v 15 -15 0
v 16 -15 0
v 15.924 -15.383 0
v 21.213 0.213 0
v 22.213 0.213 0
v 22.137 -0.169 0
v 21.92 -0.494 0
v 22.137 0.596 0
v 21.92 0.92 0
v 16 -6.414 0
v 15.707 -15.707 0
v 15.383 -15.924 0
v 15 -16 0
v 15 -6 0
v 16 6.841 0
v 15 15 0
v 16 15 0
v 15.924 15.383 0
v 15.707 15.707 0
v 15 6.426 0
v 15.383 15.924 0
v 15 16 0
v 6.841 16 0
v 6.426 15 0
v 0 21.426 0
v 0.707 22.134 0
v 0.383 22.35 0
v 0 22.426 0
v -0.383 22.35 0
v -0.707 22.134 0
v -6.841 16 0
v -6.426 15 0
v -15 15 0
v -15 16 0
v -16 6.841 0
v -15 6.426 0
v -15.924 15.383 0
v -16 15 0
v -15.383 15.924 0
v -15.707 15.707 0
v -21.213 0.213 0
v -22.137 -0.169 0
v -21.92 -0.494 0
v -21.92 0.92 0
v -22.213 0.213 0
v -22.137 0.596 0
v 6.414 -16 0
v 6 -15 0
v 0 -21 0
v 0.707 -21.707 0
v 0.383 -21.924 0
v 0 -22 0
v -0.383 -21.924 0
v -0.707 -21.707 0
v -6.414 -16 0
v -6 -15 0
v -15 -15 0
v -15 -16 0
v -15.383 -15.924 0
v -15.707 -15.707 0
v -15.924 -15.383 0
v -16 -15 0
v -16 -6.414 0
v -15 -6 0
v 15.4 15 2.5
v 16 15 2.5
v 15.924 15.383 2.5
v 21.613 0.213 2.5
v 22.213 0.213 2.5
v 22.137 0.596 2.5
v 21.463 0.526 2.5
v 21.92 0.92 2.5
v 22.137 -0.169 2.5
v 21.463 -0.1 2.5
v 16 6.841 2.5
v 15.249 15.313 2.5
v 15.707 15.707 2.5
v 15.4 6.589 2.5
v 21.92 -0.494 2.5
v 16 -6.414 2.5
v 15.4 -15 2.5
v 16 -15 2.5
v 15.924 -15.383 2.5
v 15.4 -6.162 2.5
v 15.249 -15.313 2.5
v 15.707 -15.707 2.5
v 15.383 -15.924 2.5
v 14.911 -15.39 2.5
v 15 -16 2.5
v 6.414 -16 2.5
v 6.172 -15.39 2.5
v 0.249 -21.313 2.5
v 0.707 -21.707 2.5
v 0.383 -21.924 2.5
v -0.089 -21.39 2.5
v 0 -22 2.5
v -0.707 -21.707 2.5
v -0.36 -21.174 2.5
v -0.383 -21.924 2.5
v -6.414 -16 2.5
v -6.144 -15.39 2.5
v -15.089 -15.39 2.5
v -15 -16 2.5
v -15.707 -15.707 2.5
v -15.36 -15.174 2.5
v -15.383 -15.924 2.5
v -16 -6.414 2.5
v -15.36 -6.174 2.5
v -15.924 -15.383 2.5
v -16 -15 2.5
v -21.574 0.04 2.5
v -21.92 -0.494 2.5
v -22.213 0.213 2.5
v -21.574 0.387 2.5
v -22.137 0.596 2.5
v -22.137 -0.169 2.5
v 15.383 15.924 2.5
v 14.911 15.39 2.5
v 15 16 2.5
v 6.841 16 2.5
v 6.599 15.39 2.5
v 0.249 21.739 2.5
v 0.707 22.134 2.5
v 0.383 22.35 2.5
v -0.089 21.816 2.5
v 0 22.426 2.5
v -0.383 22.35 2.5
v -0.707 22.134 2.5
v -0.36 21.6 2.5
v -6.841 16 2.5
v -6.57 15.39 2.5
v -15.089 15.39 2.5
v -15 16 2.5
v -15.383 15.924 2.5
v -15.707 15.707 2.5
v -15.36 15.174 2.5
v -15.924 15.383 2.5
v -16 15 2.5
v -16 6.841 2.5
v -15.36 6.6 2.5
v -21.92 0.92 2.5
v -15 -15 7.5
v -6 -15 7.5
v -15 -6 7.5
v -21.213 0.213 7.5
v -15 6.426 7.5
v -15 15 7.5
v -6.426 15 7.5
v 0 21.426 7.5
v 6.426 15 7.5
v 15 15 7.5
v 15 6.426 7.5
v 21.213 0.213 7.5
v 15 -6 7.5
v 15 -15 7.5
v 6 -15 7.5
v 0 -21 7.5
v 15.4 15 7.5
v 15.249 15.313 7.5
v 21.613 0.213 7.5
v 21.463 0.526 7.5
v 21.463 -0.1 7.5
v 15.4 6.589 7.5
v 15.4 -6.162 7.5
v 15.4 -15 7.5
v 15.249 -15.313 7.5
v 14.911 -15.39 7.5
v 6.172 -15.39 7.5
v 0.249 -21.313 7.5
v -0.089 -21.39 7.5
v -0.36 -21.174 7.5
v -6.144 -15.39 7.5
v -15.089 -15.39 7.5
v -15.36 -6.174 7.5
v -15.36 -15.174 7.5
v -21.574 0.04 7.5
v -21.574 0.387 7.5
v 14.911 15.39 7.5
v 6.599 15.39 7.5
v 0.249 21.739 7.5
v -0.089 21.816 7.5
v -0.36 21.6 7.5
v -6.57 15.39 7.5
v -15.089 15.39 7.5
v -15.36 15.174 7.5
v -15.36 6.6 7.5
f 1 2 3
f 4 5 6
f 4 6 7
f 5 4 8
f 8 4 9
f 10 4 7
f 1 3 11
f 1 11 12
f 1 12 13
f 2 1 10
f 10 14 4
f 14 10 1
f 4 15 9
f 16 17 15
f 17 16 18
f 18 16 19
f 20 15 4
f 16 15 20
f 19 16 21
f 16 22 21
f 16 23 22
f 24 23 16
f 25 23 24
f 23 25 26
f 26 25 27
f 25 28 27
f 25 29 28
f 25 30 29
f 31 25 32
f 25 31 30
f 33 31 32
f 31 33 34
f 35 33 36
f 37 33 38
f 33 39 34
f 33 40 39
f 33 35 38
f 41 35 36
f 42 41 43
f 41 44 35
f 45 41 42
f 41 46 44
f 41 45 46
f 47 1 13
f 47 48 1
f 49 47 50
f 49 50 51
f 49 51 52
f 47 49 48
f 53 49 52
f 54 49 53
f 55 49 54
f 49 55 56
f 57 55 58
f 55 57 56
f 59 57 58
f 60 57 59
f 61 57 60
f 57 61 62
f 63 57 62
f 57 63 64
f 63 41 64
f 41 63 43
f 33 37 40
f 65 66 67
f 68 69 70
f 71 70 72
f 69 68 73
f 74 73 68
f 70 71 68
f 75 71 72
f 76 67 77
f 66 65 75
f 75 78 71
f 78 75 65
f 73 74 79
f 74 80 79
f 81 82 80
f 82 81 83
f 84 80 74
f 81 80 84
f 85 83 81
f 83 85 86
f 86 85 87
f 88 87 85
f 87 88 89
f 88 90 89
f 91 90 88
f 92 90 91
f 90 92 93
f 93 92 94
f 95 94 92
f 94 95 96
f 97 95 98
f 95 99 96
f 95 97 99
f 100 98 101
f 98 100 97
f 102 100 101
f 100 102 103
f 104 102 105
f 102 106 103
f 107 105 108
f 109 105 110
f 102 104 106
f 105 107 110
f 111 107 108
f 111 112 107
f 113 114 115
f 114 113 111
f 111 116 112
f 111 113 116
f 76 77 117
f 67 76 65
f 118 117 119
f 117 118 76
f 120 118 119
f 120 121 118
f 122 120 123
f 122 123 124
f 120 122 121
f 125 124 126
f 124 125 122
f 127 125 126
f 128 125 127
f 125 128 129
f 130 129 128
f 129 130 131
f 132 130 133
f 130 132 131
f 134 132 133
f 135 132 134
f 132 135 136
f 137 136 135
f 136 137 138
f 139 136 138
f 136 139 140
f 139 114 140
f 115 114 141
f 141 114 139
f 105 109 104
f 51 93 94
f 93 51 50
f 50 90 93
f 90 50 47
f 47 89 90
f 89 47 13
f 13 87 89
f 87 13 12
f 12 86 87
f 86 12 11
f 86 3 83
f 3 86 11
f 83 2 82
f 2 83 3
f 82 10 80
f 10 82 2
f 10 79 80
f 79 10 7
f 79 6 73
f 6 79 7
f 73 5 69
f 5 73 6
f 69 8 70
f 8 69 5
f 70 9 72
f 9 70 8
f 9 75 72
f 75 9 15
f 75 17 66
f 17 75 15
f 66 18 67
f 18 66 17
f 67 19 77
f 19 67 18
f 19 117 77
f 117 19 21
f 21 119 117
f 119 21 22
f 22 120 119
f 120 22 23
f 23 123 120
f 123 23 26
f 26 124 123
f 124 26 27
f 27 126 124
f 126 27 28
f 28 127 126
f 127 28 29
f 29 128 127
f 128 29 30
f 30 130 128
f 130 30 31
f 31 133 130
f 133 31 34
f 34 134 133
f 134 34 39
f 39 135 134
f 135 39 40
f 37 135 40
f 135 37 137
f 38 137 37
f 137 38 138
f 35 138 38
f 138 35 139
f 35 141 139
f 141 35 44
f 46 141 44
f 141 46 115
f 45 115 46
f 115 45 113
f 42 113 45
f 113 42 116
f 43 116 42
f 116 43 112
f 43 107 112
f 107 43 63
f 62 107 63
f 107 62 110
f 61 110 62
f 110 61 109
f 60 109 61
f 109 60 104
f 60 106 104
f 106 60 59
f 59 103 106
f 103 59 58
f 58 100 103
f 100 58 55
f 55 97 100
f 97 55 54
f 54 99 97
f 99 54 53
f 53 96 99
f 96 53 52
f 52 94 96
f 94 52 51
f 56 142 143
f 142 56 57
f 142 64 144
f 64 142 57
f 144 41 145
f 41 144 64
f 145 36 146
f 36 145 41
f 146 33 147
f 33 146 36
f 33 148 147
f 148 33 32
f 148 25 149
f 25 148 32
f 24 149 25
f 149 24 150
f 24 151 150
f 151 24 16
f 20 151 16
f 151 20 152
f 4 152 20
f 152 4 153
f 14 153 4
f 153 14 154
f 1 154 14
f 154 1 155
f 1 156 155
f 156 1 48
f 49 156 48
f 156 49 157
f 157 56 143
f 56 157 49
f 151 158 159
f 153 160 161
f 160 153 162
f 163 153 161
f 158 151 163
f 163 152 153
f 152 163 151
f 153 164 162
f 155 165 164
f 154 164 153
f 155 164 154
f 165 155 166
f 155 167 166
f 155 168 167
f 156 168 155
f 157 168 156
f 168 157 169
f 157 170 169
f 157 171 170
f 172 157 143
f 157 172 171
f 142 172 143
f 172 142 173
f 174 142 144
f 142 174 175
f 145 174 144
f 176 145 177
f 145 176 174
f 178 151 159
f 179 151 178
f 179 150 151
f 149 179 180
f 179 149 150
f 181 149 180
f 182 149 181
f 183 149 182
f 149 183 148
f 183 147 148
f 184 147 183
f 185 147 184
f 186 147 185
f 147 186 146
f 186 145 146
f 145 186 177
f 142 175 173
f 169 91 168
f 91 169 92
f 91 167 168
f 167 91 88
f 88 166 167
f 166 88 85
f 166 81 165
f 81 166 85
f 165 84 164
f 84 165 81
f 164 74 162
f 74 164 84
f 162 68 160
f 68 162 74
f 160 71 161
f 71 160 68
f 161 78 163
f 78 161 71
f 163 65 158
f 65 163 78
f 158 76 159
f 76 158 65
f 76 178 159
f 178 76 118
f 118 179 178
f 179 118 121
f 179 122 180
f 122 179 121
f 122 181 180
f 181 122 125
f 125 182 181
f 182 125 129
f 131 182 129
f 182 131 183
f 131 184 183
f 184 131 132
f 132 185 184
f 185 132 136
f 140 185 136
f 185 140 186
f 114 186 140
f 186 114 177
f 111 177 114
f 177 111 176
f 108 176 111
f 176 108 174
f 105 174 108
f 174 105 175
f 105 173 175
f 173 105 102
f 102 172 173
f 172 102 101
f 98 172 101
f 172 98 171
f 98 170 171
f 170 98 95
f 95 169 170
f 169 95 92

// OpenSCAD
// file: CookieCutter.scad
module offset_shell(thickness = 0.1) {
  render() {
      difference() {
          minkowski() {
            children();
            circle(2* thickness, center=true);
          }
        children();
      }
   }
}

module cookie_cutter(handle_thickness=2.5, cutter_tickness=1, total_height=10) {
    union() {
        linear_extrude(height = total_height*(0.25), slices = 60) { 
            scale([.2,.2,1]) {
              offset_shell(handle_thickness) {
                children();

              }
            }
        };
        linear_extrude(height = total_height*(0.75), slices = 60)
            translate([0,0,2]) 
            scale([.2,.2,1]) {
              offset_shell(cutter_tickness) {
                children();
            }
        };
    }
}


//module cookie_press(handle_thickness=2.5, cutter_tickness=1, total_height=10) {
//    union() {
//        cookie_cutter(handle_thickness, cutter_tickness, total_height);
//        translate([0,0,10]) children();
//    }
//}
//
//
// file: ComplexShapes.scad
include <BasicShapes.scad>

module HalfCylinder(r, h, e=1, center=false) {
    translate([0,0, center ? -h/2 : 0])difference(){
        cylinder(h,r,r);
        translate([0,-r,-e])cube([2*r,2*r,h+2*e]);
    }
}

module HalfCircle(r) {
    difference(){
        circle(r);
        translate([-r,-2*r,0]) square(2*r);
    }
}

module Crescent(r, fatten_scale=1, curve_angle=0, rotate=0) {
    r_prime = r / fatten_scale;
    rotate([0,0,rotate]) difference() {
        circle(r_prime*1.1);
        translate([r_prime/4, curve_angle*r_prime/4, 0]) circle(r_prime*fatten_scale);
    }
}


module round_edges(r) {
    minkowski() {
        children();
        circle(r);
    };
}

module CrescentV2(outer_r, inner_r, r_shift, edge_rounding=2) {
    // Different way to construct ... rounded edges ...
   round_edges(edge_rounding) {
        difference() {
            circle(outer_r);
            translate(r_shift) circle(inner_r);
        };
    };
}


//module Arch(x,y,r) {
//    // http://kitwallace.co.uk/Blog/item/2013-01-28T17:59:00Z
//    union() {
//        intersection() {
//           translate([x,y,0]) circle(r);
//           translate([-x,y,0]) circle(r);
//        }
//        translate([0,y/2,0]) square(size=[2 * (r-x), y], center=true);
//    }
//}

module Arch(width, arc_height, strech_height=0) {
    // http://kitwallace.co.uk/Blog/item/2013-01-28T17:59:00Z
    r = arc_height;
    x = (width / 2) - r;
    y = arc_height + strech_height;
    union() {
        intersection() {
           translate([x,y,0]) circle(r);
           translate([-x,y,0]) circle(r);
        }
        translate([0,y/2,0]) square(size=[width, y], center=true);
    }
}
// file: BasicShapes.scad
module Star(points, outer, inner_defaulted=0) {
    inner = inner_defaulted == 0 ? 2 * outer  : inner_defaulted;
	// polar to cartesian: radius/angle to x/y
	function x(r, a) = r * cos(a);
	function y(r, a) = r * sin(a);
	
	// angular width of each pie slice of the star
	increment = 360/points;
	
	union() {
		for (p = [0 : points-1]) {
			
			// outer is outer point p
			// inner is inner point following p
			// next is next outer point following p

			assign(	
                x_outer = x(outer, increment * p),
                y_outer = y(outer, increment * p),
                x_inner = x(inner, (increment * p) + (increment/2)),
                y_inner = y(inner, (increment * p) + (increment/2)),
                x_next  = x(outer, increment * (p+1)),
                y_next  = y(outer, increment * (p+1))
            ) {
				polygon(
                    points = [
                        [x_outer, y_outer], 
                        [x_inner, y_inner],
                        [x_next, y_next], 
                        [0, 0]
                    ], 
                    paths  = [[0, 1, 2, 3]]
                );
			}
		}
	}
}

//https://github.com/openscad/MCAD/blob/master/shapes.scad
module Hexagon(size) {
  Star(3, size, size);
}

module Octagon(size) {
  Star(4, size, size);
}
// main file
include <BasicShapes.scad>
include <ComplexShapes.scad>
include <CookieCutter.scad>


module InnerFold(size=20) {
    translate([-size/2, -size/2])
        union() {
            translate([0, 0])rotate([0,0,0])square(size,size);
            translate([size/2, -size/5])rotate([0,0,45])square(size,size);
        }
}

cookie_cutter() {
    InnerFold(150);
}
